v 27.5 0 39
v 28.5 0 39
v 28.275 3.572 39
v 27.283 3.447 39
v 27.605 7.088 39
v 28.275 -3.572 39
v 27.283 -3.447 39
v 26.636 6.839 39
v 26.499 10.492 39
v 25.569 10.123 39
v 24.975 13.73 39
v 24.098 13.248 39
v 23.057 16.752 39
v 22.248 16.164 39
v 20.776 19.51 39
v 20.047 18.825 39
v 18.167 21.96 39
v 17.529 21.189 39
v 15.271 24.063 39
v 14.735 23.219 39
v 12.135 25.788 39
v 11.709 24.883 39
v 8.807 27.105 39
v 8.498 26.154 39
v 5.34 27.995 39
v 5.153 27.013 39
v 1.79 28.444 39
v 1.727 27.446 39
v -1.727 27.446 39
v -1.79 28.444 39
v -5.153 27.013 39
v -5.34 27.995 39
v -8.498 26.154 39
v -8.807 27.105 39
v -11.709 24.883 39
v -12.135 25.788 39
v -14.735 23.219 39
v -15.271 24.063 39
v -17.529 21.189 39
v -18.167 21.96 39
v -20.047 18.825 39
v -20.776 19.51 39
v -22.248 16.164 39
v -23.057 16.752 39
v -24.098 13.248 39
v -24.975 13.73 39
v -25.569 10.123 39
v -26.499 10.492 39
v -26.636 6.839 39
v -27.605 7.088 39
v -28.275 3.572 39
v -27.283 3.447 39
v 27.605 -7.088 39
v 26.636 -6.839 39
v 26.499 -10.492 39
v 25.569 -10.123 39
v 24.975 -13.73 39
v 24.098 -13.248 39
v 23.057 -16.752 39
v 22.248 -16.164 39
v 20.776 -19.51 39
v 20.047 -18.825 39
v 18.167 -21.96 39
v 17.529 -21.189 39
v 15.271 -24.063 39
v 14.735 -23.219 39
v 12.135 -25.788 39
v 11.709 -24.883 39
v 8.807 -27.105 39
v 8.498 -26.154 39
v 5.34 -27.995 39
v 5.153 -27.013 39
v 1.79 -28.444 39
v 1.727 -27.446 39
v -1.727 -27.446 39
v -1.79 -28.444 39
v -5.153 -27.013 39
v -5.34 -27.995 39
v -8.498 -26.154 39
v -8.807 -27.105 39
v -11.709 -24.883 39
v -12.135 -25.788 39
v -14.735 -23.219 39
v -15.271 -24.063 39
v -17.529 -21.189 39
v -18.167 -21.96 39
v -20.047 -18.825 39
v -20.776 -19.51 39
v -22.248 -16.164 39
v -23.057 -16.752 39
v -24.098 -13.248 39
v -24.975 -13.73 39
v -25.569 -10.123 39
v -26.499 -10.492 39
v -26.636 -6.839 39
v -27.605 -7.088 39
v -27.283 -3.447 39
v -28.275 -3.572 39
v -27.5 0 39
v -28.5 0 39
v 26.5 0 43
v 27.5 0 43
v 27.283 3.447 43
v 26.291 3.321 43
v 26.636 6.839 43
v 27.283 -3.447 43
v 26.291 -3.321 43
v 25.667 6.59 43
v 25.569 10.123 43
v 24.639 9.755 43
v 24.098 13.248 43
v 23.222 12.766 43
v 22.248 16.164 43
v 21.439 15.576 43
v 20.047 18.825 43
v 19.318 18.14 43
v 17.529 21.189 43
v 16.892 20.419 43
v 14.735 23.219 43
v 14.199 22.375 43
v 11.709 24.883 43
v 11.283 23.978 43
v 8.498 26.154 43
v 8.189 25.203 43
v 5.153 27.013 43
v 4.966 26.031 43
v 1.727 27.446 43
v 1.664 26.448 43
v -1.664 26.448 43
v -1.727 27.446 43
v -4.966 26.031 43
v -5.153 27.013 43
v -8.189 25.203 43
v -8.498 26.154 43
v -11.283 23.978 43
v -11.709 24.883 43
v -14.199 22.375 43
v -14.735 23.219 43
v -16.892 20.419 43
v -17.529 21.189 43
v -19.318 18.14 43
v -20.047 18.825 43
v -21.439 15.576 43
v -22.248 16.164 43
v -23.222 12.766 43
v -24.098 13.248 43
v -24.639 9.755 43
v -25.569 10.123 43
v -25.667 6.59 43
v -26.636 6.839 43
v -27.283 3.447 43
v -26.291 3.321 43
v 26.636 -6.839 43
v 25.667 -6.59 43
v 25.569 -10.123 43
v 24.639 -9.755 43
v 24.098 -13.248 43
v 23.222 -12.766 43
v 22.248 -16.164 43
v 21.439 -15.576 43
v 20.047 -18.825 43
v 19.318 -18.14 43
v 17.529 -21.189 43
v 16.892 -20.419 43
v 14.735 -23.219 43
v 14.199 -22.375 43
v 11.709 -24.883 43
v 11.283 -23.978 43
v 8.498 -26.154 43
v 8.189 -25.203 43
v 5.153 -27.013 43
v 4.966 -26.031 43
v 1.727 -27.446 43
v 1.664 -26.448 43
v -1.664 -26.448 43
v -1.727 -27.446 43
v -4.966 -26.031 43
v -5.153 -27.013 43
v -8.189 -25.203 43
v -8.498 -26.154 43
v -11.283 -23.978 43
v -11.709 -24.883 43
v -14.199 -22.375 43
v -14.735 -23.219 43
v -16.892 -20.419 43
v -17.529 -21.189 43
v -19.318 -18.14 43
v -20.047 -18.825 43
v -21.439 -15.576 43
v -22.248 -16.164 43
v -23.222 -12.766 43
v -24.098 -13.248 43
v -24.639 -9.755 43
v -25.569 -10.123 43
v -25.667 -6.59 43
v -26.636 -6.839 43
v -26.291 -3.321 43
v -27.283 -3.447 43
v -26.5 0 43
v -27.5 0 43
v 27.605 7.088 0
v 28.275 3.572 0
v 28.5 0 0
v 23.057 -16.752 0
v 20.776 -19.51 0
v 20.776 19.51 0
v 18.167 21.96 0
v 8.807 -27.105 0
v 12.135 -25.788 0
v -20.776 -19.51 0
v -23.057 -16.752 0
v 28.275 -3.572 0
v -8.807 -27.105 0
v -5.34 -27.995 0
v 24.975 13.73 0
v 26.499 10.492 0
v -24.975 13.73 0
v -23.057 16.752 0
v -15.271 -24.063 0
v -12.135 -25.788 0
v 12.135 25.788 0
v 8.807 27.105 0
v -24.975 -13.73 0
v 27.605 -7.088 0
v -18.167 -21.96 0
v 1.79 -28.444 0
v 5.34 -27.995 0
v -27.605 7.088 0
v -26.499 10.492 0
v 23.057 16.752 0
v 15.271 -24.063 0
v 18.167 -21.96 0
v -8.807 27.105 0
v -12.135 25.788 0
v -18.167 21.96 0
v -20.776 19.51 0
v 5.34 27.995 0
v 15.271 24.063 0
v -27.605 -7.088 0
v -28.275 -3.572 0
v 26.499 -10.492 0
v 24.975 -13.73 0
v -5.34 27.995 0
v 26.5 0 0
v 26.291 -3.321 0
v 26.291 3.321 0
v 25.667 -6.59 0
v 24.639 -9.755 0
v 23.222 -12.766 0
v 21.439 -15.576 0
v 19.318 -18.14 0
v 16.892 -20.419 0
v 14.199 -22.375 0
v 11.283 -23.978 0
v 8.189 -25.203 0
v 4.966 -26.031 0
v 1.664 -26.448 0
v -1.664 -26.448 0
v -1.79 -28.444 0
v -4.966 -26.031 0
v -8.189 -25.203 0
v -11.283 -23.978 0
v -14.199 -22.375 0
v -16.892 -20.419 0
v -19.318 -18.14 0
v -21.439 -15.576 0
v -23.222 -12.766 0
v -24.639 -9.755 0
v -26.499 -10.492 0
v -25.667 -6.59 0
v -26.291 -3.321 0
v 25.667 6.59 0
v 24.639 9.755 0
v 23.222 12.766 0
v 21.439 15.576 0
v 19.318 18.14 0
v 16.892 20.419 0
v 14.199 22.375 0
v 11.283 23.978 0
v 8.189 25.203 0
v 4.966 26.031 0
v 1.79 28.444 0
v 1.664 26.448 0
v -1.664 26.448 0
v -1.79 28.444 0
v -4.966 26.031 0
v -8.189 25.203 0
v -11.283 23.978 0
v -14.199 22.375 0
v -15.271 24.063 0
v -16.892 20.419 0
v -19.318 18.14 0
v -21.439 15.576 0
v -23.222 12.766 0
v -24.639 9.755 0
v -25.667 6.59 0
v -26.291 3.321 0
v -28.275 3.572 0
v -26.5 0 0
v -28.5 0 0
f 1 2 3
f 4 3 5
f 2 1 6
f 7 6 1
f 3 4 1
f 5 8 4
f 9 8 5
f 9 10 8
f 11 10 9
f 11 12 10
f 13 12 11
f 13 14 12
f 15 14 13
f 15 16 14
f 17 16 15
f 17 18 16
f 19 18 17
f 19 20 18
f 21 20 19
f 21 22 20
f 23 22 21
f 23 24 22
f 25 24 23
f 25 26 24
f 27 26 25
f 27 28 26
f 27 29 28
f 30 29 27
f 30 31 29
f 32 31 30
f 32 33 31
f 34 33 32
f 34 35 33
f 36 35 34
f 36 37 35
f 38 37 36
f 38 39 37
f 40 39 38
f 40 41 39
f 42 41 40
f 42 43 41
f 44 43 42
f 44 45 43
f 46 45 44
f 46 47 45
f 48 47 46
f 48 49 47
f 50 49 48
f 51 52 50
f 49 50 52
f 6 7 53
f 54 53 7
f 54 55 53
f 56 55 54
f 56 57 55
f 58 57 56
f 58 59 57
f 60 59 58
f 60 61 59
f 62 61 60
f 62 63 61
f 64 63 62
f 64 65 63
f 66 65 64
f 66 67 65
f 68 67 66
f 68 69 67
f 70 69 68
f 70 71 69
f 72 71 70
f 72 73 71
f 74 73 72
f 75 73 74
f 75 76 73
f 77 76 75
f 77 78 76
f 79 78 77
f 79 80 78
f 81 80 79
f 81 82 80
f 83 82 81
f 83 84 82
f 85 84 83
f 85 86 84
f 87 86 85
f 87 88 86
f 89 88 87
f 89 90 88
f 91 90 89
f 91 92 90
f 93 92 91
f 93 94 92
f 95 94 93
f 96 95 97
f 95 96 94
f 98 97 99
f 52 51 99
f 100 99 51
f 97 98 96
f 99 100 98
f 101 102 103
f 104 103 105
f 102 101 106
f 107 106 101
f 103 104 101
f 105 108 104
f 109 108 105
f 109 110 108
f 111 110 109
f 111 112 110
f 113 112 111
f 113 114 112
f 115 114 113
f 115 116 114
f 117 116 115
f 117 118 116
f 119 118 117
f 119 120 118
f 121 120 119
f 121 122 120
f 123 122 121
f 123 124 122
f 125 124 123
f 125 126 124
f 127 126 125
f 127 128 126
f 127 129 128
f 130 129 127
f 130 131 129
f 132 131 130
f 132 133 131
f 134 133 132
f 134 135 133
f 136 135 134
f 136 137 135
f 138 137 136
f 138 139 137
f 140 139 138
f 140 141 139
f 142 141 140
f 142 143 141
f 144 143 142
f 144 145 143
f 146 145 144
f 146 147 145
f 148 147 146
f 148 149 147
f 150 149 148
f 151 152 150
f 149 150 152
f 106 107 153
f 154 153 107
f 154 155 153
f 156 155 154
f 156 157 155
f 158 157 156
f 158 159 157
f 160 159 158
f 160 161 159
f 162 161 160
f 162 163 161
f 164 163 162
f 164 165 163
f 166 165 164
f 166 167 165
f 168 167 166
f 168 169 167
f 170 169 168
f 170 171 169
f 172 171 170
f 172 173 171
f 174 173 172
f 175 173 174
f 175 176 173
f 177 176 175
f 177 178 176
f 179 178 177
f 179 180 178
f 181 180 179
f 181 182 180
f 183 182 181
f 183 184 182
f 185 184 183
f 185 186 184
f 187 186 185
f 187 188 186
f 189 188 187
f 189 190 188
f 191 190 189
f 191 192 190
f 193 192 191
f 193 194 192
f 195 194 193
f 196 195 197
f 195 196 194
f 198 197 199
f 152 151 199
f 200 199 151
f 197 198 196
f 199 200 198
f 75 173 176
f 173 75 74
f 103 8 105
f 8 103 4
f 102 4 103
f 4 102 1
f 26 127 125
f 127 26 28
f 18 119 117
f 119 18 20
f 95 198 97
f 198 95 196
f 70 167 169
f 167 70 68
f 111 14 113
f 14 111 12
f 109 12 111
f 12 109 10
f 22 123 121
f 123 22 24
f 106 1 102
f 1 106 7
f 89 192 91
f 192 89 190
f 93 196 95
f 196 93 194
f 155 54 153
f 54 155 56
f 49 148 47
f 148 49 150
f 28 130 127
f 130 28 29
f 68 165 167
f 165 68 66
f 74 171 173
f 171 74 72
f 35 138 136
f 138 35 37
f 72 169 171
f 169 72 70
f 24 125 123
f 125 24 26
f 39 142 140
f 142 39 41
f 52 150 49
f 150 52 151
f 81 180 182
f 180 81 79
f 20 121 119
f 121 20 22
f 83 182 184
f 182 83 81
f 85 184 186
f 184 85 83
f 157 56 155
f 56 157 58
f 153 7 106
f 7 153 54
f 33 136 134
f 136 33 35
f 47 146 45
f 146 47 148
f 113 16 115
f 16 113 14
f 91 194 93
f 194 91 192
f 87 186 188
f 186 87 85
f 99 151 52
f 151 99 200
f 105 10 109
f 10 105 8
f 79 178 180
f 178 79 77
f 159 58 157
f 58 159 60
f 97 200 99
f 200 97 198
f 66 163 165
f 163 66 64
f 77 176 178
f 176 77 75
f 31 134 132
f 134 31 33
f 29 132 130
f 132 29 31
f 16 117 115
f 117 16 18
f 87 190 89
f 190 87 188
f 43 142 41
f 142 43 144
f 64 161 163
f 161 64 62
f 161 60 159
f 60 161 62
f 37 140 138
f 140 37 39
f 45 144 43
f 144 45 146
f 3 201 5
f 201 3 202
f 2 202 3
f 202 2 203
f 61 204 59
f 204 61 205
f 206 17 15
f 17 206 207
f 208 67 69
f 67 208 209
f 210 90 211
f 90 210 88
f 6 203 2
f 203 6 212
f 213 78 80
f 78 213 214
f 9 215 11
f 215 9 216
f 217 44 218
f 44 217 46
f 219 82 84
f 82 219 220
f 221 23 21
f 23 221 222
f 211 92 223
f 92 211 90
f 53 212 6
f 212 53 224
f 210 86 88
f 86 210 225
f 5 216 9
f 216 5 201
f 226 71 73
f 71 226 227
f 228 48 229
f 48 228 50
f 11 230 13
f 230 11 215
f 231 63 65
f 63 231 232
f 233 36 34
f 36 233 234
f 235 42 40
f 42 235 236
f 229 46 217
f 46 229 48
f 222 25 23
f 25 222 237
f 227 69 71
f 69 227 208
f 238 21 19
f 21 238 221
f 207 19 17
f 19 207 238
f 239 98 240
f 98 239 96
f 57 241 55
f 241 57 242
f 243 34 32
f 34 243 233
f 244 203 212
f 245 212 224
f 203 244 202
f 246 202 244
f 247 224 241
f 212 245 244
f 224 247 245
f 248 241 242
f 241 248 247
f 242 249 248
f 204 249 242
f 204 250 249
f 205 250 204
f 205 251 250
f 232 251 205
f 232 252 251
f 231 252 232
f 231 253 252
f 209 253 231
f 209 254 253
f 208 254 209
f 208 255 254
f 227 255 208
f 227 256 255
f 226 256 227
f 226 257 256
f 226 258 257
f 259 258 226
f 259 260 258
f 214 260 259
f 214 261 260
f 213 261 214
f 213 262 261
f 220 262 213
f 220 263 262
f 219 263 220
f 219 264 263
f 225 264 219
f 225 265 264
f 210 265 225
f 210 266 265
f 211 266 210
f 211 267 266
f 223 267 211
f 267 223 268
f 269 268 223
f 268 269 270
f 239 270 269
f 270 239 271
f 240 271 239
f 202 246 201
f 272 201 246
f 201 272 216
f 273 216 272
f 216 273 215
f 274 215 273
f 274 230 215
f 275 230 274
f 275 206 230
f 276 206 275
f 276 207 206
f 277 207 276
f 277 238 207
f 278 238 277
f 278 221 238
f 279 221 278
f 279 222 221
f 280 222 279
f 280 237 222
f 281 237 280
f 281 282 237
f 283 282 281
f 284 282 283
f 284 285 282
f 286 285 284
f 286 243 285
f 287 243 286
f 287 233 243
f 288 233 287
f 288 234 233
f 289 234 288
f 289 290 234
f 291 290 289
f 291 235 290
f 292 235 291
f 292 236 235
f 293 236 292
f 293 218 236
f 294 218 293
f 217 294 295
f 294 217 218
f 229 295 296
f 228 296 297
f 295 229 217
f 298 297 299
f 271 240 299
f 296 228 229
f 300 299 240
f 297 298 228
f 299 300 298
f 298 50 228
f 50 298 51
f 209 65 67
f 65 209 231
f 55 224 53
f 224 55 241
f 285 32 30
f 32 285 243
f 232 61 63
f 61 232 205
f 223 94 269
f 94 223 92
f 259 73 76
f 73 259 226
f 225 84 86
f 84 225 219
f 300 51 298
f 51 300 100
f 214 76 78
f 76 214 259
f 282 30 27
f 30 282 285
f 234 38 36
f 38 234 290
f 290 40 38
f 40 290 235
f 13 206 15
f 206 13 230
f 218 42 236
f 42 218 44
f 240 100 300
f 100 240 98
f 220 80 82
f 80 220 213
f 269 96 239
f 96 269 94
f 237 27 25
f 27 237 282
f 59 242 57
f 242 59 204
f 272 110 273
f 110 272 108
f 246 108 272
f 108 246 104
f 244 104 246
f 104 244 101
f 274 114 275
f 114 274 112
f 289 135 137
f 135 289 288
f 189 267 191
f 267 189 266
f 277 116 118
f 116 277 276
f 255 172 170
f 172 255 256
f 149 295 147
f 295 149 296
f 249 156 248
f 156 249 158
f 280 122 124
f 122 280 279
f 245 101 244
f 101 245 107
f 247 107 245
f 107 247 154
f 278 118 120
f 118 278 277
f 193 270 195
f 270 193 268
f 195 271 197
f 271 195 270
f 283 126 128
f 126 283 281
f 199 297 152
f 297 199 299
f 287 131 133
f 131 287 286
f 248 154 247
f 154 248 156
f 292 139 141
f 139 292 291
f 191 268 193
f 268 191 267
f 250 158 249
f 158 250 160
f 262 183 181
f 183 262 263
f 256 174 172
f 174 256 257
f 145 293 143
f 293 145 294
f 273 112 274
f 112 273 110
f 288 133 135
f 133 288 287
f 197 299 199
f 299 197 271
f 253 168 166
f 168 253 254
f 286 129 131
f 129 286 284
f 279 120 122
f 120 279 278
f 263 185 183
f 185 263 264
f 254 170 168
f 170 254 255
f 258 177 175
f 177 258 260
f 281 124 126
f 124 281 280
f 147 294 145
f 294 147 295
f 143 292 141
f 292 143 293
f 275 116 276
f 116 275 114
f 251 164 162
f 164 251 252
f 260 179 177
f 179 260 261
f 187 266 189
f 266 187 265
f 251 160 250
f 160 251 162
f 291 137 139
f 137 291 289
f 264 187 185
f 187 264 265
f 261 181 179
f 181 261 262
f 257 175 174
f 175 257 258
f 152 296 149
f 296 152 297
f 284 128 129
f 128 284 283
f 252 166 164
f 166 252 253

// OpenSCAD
$fn=50;
outerWidth=57;
wallWidth=4;
tabWidth=4;
hd=0.5; // holder distance
height = 43;



module mainCube()
{
	innerWidth = outerWidth - wallWidth;
	offset = (outerWidth - innerWidth) /2;
	
	difference()
	{
		union()
		{
			cylinder(d=outerWidth,h=height);
		}
		cylinder(d=innerWidth,h=height);
		translate([0,0, height - tabWidth]) difference()
		{
			cylinder(d=outerWidth+0.5,h=tabWidth);
			cylinder(d=outerWidth-(wallWidth/2),h=tabWidth);
		}
		
	}
	
}

mainCube();
